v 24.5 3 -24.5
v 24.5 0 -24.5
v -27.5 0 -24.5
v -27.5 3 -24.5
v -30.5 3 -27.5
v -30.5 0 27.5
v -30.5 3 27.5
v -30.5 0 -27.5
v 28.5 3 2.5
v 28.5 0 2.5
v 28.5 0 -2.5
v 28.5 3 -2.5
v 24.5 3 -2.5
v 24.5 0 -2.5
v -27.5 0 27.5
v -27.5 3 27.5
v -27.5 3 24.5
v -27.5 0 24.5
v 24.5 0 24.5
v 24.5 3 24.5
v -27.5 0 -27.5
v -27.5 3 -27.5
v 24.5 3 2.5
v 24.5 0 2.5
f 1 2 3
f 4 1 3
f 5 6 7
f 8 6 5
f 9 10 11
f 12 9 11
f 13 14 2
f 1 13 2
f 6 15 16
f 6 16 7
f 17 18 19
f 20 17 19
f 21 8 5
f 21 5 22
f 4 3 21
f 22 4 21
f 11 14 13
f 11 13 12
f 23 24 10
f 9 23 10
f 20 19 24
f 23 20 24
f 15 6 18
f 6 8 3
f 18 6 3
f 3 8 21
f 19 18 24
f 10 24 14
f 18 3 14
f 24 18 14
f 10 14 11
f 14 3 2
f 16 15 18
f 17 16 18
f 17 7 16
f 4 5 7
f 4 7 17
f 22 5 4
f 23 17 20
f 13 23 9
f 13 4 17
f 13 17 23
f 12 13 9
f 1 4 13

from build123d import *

# Parameters (mm, degrees)
SKETCH1_W           = 49
SKETCH1_H           = 49
SKETCH1_W_2         = 4
SKETCH1_H_2         = 5
SKETCH1_W_3         = 3
BOSS_EXTRUDE1_DEPTH = 3


with BuildPart() as part:
    # Sketch1 → Boss-Extrude1 (new body)
    with BuildSketch(Plane(origin=(0, 0, 0), x_dir=(1, 0, 0), z_dir=(0, 1, 0))):
        Rectangle(SKETCH1_W, SKETCH1_H)
        with Locations((26.5, 0)):
            Rectangle(SKETCH1_W_2, SKETCH1_H_2)
        Polygon((-27.5, 27.5), (-27.5, 24.5), (-27.5, -24.5), (-27.5, -27.5), (-30.5, -27.5), (-30.5, 27.5), align=None)
        with Locations((-26, 0)):
            Rectangle(SKETCH1_W_3, SKETCH1_H)
    extrude(amount=BOSS_EXTRUDE1_DEPTH)


solid = part.part
